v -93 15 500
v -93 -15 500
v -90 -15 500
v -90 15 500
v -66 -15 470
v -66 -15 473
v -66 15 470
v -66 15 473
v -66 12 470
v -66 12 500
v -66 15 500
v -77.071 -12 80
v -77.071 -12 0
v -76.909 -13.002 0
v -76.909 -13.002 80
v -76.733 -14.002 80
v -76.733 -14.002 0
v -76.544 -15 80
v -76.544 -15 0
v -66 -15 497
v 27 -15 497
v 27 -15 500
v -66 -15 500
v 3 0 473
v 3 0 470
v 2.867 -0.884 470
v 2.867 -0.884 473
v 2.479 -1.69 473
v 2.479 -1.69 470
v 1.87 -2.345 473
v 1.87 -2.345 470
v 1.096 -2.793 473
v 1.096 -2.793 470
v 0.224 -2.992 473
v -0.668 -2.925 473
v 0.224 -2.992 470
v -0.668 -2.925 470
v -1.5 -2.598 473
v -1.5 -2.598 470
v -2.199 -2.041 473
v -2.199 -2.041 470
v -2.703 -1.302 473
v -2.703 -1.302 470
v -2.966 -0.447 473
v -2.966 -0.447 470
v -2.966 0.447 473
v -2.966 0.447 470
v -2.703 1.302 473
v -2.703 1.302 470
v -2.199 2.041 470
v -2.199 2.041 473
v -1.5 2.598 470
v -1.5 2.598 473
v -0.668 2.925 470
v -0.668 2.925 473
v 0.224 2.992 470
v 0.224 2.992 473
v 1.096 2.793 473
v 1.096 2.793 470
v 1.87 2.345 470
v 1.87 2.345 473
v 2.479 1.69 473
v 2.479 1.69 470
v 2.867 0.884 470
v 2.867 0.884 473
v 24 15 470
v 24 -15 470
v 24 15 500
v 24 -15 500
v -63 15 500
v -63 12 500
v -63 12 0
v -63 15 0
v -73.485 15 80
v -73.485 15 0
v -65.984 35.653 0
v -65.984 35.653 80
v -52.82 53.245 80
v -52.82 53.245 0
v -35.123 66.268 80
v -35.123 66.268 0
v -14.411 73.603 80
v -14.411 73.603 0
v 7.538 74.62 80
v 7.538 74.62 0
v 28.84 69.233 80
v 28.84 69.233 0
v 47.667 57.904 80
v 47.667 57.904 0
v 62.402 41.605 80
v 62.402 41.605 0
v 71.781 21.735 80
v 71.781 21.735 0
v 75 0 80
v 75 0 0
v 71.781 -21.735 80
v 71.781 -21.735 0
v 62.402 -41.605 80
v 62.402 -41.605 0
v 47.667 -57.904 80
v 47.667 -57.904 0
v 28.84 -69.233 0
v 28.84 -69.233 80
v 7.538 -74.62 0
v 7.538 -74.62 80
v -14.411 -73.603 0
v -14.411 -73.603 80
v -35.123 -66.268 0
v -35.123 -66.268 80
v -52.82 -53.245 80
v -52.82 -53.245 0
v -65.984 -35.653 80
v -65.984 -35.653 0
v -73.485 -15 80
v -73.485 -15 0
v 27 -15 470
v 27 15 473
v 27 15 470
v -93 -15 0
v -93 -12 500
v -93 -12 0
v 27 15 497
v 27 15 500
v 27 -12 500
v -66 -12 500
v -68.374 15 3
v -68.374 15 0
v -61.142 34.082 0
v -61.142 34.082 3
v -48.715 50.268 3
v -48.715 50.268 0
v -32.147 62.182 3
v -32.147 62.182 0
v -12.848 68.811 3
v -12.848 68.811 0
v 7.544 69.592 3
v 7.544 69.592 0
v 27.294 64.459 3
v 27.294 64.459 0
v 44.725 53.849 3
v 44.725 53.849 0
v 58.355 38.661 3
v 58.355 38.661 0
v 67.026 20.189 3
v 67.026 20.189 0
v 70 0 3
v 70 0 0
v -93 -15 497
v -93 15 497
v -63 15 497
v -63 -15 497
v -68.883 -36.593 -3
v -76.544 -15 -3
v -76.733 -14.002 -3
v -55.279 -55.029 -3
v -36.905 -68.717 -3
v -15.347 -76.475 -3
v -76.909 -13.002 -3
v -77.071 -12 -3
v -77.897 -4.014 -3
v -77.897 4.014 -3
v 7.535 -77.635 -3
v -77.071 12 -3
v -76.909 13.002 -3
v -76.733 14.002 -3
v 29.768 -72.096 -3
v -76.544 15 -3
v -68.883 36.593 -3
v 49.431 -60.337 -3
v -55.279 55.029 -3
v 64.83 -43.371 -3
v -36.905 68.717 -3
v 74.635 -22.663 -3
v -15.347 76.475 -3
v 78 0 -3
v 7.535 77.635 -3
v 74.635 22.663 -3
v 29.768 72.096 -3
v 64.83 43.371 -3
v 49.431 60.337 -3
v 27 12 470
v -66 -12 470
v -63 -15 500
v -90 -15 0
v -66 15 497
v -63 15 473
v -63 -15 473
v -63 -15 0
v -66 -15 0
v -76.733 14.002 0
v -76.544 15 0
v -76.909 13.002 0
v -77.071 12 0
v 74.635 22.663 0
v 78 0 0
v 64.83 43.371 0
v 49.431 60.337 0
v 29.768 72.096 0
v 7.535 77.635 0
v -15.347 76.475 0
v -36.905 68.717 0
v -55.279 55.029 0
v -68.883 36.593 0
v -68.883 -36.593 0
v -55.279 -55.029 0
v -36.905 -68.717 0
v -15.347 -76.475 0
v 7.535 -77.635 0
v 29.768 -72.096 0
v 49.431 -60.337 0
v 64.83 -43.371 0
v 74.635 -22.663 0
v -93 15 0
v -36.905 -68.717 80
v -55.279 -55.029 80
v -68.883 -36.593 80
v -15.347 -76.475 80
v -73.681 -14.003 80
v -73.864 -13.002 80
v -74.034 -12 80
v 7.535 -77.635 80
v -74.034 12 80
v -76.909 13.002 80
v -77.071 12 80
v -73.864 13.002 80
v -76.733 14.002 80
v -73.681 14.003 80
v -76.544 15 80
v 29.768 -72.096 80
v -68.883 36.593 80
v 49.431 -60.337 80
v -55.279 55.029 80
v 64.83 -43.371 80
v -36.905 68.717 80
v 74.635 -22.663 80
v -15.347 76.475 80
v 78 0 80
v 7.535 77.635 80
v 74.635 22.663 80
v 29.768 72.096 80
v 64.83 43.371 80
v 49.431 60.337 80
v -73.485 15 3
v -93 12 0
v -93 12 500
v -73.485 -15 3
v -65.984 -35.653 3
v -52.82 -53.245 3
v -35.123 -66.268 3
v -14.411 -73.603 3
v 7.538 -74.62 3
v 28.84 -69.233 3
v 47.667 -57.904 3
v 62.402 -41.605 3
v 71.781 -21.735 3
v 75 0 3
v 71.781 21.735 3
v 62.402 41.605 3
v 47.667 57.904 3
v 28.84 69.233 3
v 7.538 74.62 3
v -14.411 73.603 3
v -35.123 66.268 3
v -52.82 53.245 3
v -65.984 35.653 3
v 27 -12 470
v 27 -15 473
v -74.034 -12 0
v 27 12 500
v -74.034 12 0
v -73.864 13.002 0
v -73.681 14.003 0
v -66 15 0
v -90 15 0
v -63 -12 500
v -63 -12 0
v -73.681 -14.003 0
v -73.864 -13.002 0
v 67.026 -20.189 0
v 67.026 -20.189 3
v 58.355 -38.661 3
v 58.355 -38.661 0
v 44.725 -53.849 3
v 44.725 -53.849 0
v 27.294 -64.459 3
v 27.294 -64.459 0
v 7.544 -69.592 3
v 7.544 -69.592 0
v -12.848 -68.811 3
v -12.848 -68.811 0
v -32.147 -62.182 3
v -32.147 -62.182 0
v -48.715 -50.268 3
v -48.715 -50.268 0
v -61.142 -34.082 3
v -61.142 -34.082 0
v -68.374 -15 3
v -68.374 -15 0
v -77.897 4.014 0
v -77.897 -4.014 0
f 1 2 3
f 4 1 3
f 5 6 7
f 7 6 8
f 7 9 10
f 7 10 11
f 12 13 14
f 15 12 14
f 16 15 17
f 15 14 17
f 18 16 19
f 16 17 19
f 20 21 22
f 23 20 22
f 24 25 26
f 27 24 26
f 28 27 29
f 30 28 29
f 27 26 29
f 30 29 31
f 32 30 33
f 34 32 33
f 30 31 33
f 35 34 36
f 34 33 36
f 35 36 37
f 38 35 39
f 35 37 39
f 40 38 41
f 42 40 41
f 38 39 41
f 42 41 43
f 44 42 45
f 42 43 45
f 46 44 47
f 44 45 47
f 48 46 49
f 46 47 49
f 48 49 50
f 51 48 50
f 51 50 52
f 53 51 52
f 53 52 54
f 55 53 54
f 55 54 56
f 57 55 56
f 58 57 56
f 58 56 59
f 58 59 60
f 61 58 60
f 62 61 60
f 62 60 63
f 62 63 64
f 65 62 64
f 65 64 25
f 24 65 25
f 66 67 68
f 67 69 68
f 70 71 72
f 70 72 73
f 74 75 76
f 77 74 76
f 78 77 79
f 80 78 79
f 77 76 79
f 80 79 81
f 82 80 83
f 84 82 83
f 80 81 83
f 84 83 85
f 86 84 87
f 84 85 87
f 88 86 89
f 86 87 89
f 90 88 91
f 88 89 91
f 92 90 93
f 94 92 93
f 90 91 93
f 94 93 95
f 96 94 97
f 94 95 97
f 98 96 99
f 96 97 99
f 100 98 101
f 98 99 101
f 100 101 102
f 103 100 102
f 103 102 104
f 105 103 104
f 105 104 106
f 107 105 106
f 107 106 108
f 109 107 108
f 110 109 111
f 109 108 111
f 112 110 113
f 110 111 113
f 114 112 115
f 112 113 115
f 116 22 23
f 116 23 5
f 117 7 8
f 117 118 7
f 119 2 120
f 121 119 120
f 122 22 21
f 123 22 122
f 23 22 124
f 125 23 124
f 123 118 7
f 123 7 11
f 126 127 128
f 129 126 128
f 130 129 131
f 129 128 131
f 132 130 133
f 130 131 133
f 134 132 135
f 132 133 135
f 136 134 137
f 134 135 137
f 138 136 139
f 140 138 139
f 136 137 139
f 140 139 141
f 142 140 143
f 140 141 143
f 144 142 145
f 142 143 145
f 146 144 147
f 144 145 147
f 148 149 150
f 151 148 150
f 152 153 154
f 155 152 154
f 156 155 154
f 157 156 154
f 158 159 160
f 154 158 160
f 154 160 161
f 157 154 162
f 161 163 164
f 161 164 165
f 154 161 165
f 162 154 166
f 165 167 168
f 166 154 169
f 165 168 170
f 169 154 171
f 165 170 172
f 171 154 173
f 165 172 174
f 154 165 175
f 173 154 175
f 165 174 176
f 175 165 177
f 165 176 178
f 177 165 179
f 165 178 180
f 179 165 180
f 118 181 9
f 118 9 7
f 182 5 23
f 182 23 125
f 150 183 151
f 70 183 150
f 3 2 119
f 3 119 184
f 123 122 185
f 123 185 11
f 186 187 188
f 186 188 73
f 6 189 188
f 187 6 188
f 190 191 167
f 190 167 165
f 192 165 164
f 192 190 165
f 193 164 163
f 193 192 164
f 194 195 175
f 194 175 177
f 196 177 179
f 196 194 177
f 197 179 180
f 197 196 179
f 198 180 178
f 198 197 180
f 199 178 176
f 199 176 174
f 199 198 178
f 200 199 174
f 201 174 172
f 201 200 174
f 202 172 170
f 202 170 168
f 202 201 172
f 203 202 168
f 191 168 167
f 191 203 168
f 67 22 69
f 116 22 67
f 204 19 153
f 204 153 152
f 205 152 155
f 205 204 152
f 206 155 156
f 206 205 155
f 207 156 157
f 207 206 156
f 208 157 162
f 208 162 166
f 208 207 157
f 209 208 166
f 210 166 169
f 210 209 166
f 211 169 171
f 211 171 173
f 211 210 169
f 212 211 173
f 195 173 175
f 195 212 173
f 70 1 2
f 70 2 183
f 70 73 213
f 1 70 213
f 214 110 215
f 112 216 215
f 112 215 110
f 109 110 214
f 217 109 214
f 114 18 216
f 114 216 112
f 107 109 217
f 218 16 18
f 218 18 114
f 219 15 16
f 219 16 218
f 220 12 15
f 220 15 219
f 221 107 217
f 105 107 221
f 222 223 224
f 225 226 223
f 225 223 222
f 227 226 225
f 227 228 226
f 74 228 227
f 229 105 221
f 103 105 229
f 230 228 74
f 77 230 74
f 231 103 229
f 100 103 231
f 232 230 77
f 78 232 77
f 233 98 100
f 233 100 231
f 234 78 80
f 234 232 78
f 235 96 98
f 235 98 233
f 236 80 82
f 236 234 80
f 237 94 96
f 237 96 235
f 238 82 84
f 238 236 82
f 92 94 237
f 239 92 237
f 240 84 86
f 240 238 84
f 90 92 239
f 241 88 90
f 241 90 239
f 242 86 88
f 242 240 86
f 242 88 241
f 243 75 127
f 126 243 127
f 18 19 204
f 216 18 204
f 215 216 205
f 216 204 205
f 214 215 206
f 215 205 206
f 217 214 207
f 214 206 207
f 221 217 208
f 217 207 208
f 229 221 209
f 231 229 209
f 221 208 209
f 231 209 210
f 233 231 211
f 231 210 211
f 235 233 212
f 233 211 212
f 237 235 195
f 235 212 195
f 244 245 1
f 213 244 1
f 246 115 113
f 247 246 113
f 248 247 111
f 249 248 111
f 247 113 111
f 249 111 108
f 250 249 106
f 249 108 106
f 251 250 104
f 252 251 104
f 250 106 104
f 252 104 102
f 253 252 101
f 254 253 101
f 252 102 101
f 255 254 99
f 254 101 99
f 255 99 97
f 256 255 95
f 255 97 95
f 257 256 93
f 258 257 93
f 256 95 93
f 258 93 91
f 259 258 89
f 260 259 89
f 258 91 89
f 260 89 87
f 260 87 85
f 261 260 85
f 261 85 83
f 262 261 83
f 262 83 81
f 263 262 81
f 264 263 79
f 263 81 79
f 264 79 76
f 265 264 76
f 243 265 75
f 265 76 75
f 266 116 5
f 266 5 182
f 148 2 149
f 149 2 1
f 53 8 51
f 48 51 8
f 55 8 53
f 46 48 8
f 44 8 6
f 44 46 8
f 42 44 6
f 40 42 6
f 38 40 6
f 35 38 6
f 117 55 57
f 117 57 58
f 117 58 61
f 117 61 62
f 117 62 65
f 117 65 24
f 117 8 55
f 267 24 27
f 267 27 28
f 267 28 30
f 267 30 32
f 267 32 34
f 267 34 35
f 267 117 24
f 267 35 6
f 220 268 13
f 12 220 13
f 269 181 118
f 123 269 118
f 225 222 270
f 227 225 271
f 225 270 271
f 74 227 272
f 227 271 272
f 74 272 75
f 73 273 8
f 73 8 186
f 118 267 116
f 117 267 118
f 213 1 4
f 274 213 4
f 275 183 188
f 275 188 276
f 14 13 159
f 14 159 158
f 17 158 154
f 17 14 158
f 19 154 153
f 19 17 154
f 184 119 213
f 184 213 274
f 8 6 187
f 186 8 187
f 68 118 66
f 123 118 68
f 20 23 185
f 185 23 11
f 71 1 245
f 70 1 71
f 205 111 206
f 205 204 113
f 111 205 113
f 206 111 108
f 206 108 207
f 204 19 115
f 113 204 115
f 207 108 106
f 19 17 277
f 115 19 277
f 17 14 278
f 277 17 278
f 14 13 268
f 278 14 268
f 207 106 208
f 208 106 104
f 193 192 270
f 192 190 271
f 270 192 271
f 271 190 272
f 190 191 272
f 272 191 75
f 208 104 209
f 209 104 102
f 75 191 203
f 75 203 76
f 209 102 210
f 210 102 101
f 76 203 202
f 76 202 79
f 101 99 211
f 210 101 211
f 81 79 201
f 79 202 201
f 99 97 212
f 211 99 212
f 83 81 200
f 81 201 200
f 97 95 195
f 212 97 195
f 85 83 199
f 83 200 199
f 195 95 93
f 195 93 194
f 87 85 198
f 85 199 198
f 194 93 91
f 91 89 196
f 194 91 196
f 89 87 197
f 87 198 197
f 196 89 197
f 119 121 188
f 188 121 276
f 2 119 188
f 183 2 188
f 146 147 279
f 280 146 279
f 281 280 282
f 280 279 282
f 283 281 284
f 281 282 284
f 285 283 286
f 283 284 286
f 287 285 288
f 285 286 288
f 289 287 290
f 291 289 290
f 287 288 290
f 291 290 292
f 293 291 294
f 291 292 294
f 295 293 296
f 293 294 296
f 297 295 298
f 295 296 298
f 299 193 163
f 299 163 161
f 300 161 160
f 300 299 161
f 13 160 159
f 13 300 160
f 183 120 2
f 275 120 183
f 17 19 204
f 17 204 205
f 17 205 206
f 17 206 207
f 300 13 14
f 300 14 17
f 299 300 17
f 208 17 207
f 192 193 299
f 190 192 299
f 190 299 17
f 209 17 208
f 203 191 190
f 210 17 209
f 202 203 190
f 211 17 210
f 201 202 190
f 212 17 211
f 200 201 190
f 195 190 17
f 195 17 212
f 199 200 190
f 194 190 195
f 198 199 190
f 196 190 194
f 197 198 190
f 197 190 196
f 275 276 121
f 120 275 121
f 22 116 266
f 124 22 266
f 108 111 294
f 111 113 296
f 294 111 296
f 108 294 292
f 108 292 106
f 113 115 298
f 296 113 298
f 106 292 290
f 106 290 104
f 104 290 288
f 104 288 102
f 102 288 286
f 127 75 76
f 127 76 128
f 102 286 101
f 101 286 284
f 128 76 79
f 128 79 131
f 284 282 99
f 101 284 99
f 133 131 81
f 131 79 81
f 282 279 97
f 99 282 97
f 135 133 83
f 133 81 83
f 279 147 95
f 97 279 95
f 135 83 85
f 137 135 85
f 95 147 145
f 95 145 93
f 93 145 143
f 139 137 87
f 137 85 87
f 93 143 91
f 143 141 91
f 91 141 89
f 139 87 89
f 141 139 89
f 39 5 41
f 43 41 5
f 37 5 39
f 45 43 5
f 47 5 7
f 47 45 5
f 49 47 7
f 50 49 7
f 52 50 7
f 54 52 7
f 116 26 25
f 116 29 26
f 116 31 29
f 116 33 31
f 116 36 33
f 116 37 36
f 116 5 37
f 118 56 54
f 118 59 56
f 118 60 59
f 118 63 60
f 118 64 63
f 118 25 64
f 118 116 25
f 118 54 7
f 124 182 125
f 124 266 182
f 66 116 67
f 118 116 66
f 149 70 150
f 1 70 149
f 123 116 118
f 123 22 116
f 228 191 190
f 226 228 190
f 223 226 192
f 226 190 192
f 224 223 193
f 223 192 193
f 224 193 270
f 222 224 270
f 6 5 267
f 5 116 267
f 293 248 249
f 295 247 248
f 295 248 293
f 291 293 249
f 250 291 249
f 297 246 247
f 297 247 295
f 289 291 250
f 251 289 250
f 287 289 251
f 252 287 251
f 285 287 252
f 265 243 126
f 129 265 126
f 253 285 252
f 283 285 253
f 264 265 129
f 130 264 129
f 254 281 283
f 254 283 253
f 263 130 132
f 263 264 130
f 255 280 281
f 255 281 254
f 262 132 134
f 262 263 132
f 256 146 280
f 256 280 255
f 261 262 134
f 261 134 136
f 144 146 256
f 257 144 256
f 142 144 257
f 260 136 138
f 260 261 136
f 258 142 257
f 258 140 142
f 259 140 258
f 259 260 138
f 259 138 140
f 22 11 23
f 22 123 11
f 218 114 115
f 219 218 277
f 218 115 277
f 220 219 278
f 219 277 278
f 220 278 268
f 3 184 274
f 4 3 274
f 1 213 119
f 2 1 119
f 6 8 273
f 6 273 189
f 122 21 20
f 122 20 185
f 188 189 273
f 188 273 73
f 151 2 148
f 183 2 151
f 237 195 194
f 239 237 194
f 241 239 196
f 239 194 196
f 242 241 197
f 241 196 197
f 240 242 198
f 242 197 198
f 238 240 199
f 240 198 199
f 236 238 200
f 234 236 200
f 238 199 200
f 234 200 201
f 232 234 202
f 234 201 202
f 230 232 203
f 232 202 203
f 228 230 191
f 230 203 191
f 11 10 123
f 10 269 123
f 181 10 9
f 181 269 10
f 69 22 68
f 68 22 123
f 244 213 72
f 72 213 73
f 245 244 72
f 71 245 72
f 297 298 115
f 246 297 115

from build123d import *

# Parameters (mm, degrees)
F4_W           = 3
F4_H           = 24
F4_H_2         = 3
F5_DEPTH       = 3
F6_DEPTH       = 3
F7_DEPTH       = 80
F8_DEPTH       = 500
F9_DEPTH       = 500
F10_DEPTH      = 473
F11_W          = 3
F11_H          = 24
F11_H_2        = 3
F12_DEPTH      = 90
F12_DEPTH_BACK = 3
F11_W_2        = 24
F13_DEPTH      = 90
F13_DEPTH_BACK = 3
F14_W          = 30
F14_H          = 27
F14_H_2        = 3
F15_DEPTH      = 3
F16_W          = 27
F16_H          = 30
F16_W_2        = 3
F17_DEPTH      = 3
F18_R          = 3
F19_DEPTH      = 488


with BuildPart() as f5:
    # F4 (on Top) → F5 (new body)
    with BuildSketch(Plane.XY):
        with BuildLine():
            Line((-68.3739716559, 15), (-73.4846922835, 15))
            ThreePointArc((-73.4846922835, 15), (-73.7744849304, 13.5027913134), (-74.0337760755, 12))
            Line((-74.0337760755, 12), (-68.9637585983, 12))
            ThreePointArc((-68.9637585983, 12), (-68.6852461438, 13.5032204366), (-68.3739716559, 15))
        make_face()
        with BuildLine():
            Line((-68.9637585983, 12), (-74.0337760755, 12))
            ThreePointArc((-74.0337760755, 12), (-75, 0), (-74.0337760755, -12))
            Line((-74.0337760755, -12), (-68.9637585983, -12))
            ThreePointArc((-68.9637585983, -12), (-70, 0), (-68.9637585983, 12))
        make_face()
        with BuildLine():
            ThreePointArc((-74.0337760755, -12), (-73.7744849304, -13.5027913134), (-73.4846922835, -15))
            Line((-73.4846922835, -15), (-68.3739716559, -15))
            ThreePointArc((-68.3739716559, -15), (-68.6852461438, -13.5032204366), (-68.9637585983, -12))
            Line((-68.9637585983, -12), (-74.0337760755, -12))
        make_face()
        with BuildLine():
            ThreePointArc((-73.4846922835, -15), (7.5381721504, -74.6202114754), (75, 0))
            ThreePointArc((75, 0), (7.5381721504, 74.6202114754), (-73.4846922835, 15))
            Line((-73.4846922835, 15), (-68.3739716559, 15))
            ThreePointArc((-68.3739716559, 15), (7.5439374364, 69.5923056663), (70, 0))
            ThreePointArc((70, 0), (7.5439374364, -69.5923056663), (-68.3739716559, -15))
            Line((-68.3739716559, -15), (-73.4846922835, -15))
        make_face()
        with BuildLine():
            ThreePointArc((-74.0337760755, 12), (-73.7744849304, 13.5027913134), (-73.4846922835, 15))
            Line((-73.4846922835, 15), (-76.544104933, 15))
            ThreePointArc((-76.544104933, 15), (-76.8223957656, 13.5025741556), (-77.071395472, 12))
            Line((-77.071395472, 12), (-74.0337760755, 12))
        make_face()
        with BuildLine():
            ThreePointArc((-74.0337760755, -12), (-75, 0), (-74.0337760755, 12))
            Line((-74.0337760755, 12), (-77.071395472, 12))
            ThreePointArc((-77.071395472, 12), (-78, 0), (-77.071395472, -12))
            Line((-77.071395472, -12), (-74.0337760755, -12))
        make_face()
        with BuildLine():
            Line((-76.544104933, -15), (-73.4846922835, -15))
            ThreePointArc((-73.4846922835, -15), (-73.7744849304, -13.5027913134), (-74.0337760755, -12))
            Line((-74.0337760755, -12), (-77.071395472, -12))
            ThreePointArc((-77.071395472, -12), (-76.8223957656, -13.5025741556), (-76.544104933, -15))
        make_face()
        with BuildLine():
            ThreePointArc((-73.4846922835, 15), (7.5381721504, 74.6202114754), (75, 0))
            ThreePointArc((75, 0), (7.5381721504, -74.6202114754), (-73.4846922835, -15))
            Line((-73.4846922835, -15), (-76.544104933, -15))
            ThreePointArc((-76.544104933, -15), (7.5352443631, -77.6351730364), (78, 0))
            ThreePointArc((78, 0), (7.5352443631, 77.6351730364), (-76.544104933, 15))
            Line((-76.544104933, 15), (-73.4846922835, 15))
        make_face()
        with BuildLine():
            Line((-66, 12), (-68.9637585983, 12))
            ThreePointArc((-68.9637585983, 12), (-70, 0), (-68.9637585983, -12))
            Line((-68.9637585983, -12), (-66, -12))
            Line((-66, -12), (-66, 12))
        make_face()
        with BuildLine():
            ThreePointArc((70, 0), (7.5439374364, 69.5923056663), (-68.3739716559, 15))
            Line((-68.3739716559, 15), (-66, 15))
            Line((-66, 15), (-63, 15))
            Line((-63, 15), (-63, 12))
            Line((-63, 12), (-63, -12))
            Line((-63, -12), (-63, -15))
            Line((-63, -15), (-66, -15))
            Line((-66, -15), (-68.3739716559, -15))
            ThreePointArc((-68.3739716559, -15), (7.5439374364, -69.5923056663), (70, 0))
        make_face()
        with BuildLine():
            Line((-66, 15), (-68.3739716559, 15))
            ThreePointArc((-68.3739716559, 15), (-68.6852461438, 13.5032204366), (-68.9637585983, 12))
            Line((-68.9637585983, 12), (-66, 12))
            Line((-66, 12), (-66, 15))
        make_face()
        with Locations((-64.5, 0)):
            Rectangle(F4_W, F4_H)
        with Locations((-64.5, 13.5)):
            Rectangle(F4_W, F4_H_2)
        with BuildLine():
            ThreePointArc((-68.9637585983, -12), (-68.6852461438, -13.5032204366), (-68.3739716559, -15))
            Line((-68.3739716559, -15), (-66, -15))
            Line((-66, -15), (-66, -12))
            Line((-66, -12), (-68.9637585983, -12))
        make_face()
        with Locations((-64.5, -13.5)):
            Rectangle(F4_W, F4_H_2)
    extrude(amount=-F5_DEPTH)


with BuildPart() as f6:
    # F4 (on Top) → F6 (new body)
    with BuildSketch(Plane.XY):
        with BuildLine():
            ThreePointArc((-73.4846922835, -15), (7.5381721504, -74.6202114754), (75, 0))
            ThreePointArc((75, 0), (7.5381721504, 74.6202114754), (-73.4846922835, 15))
            Line((-73.4846922835, 15), (-68.3739716559, 15))
            ThreePointArc((-68.3739716559, 15), (7.5439374364, 69.5923056663), (70, 0))
            ThreePointArc((70, 0), (7.5439374364, -69.5923056663), (-68.3739716559, -15))
            Line((-68.3739716559, -15), (-73.4846922835, -15))
        make_face()
    extrude(amount=F6_DEPTH)


with BuildPart() as f7:
    # F4 (on Top) → F7 (new body)
    with BuildSketch(Plane.XY):
        with BuildLine():
            ThreePointArc((-73.4846922835, 15), (7.5381721504, 74.6202114754), (75, 0))
            ThreePointArc((75, 0), (7.5381721504, -74.6202114754), (-73.4846922835, -15))
            Line((-73.4846922835, -15), (-76.544104933, -15))
            ThreePointArc((-76.544104933, -15), (7.5352443631, -77.6351730364), (78, 0))
            ThreePointArc((78, 0), (7.5352443631, 77.6351730364), (-76.544104933, 15))
            Line((-76.544104933, 15), (-73.4846922835, 15))
        make_face()
        with BuildLine():
            ThreePointArc((-74.0337760755, 12), (-73.7744849304, 13.5027913134), (-73.4846922835, 15))
            Line((-73.4846922835, 15), (-76.544104933, 15))
            ThreePointArc((-76.544104933, 15), (-76.8223957656, 13.5025741556), (-77.071395472, 12))
            Line((-77.071395472, 12), (-74.0337760755, 12))
        make_face()
        with BuildLine():
            Line((-76.544104933, -15), (-73.4846922835, -15))
            ThreePointArc((-73.4846922835, -15), (-73.7744849304, -13.5027913134), (-74.0337760755, -12))
            Line((-74.0337760755, -12), (-77.071395472, -12))
            ThreePointArc((-77.071395472, -12), (-76.8223957656, -13.5025741556), (-76.544104933, -15))
        make_face()
    extrude(amount=F7_DEPTH)


with BuildPart() as f8:
    # F4 (on Top) → F8 (new body)
    with BuildSketch(Plane.XY):
        with BuildLine():
            ThreePointArc((-77.071395472, 12), (-76.8223957656, 13.5025741556), (-76.544104933, 15))
            Line((-76.544104933, 15), (-90, 15))
            Line((-90, 15), (-90, 12))
            Line((-90, 12), (-77.071395472, 12))
        make_face()
        with BuildLine():
            ThreePointArc((-74.0337760755, 12), (-73.7744849304, 13.5027913134), (-73.4846922835, 15))
            Line((-73.4846922835, 15), (-76.544104933, 15))
            ThreePointArc((-76.544104933, 15), (-76.8223957656, 13.5025741556), (-77.071395472, 12))
            Line((-77.071395472, 12), (-74.0337760755, 12))
        make_face()
        with BuildLine():
            Line((-68.3739716559, 15), (-73.4846922835, 15))
            ThreePointArc((-73.4846922835, 15), (-73.7744849304, 13.5027913134), (-74.0337760755, 12))
            Line((-74.0337760755, 12), (-68.9637585983, 12))
            ThreePointArc((-68.9637585983, 12), (-68.6852461438, 13.5032204366), (-68.3739716559, 15))
        make_face()
        with BuildLine():
            Line((-66, 15), (-68.3739716559, 15))
            ThreePointArc((-68.3739716559, 15), (-68.6852461438, 13.5032204366), (-68.9637585983, 12))
            Line((-68.9637585983, 12), (-66, 12))
            Line((-66, 12), (-66, 15))
        make_face()
        with Locations((-64.5, 13.5)):
            Rectangle(F4_W, F4_H_2)
        with Locations((-91.5, 13.5)):
            Rectangle(F4_W, F4_H_2)
    extrude(amount=F8_DEPTH)


with BuildPart() as f8b:
    # F4 (on Top) → F8, piece 2 (new body)
    with BuildSketch(Plane.XY):
        with Locations((-64.5, -13.5)):
            Rectangle(F4_W, F4_H_2)
        with BuildLine():
            ThreePointArc((-68.9637585983, -12), (-68.6852461438, -13.5032204366), (-68.3739716559, -15))
            Line((-68.3739716559, -15), (-66, -15))
            Line((-66, -15), (-66, -12))
            Line((-66, -12), (-68.9637585983, -12))
        make_face()
        with BuildLine():
            ThreePointArc((-74.0337760755, -12), (-73.7744849304, -13.5027913134), (-73.4846922835, -15))
            Line((-73.4846922835, -15), (-68.3739716559, -15))
            ThreePointArc((-68.3739716559, -15), (-68.6852461438, -13.5032204366), (-68.9637585983, -12))
            Line((-68.9637585983, -12), (-74.0337760755, -12))
        make_face()
        with BuildLine():
            Line((-76.544104933, -15), (-73.4846922835, -15))
            ThreePointArc((-73.4846922835, -15), (-73.7744849304, -13.5027913134), (-74.0337760755, -12))
            Line((-74.0337760755, -12), (-77.071395472, -12))
            ThreePointArc((-77.071395472, -12), (-76.8223957656, -13.5025741556), (-76.544104933, -15))
        make_face()
        with BuildLine():
            Line((-90, -15), (-76.544104933, -15))
            ThreePointArc((-76.544104933, -15), (-76.8223957656, -13.5025741556), (-77.071395472, -12))
            Line((-77.071395472, -12), (-90, -12))
            Line((-90, -12), (-90, -15))
        make_face()
        with Locations((-91.5, -13.5)):
            Rectangle(F4_W, F4_H_2)
    extrude(amount=F8_DEPTH)


with BuildPart() as f9:
    # F4 (on Top) → F9 (new body)
    with BuildSketch(Plane.XY):
        with Locations((-91.5, 0)):
            Rectangle(F4_W, F4_H)
        with Locations((-91.5, -13.5)):
            Rectangle(F4_W, F4_H_2)
        with Locations((-91.5, 13.5)):
            Rectangle(F4_W, F4_H_2)
    extrude(amount=F9_DEPTH)


with BuildPart() as f10:
    # F4 (on Top) → F10 (new body)
    with BuildSketch(Plane.XY):
        with Locations((-64.5, 0)):
            Rectangle(F4_W, F4_H)
        with Locations((-64.5, -13.5)):
            Rectangle(F4_W, F4_H_2)
        with Locations((-64.5, 13.5)):
            Rectangle(F4_W, F4_H_2)
    extrude(amount=F10_DEPTH)


with BuildPart() as f12:
    # F11 (on face) → F12 (new body, two sides)
    with BuildSketch(Plane.YZ.offset(-63)) as f12_sk:
        with Locations((-13.5, 485)):
            Rectangle(F11_W, F11_H)
        with Locations((-13.5, 498.5)):
            Rectangle(F11_W, F11_H_2)
        with Locations((-13.5, 471.5)):
            Rectangle(F11_W, F11_H_2)
    extrude(amount=F12_DEPTH)
    extrude(f12_sk.sketch, amount=-F12_DEPTH_BACK)


with BuildPart() as f12b:
    # F11 (on face) → F12, piece 2 (new body, two sides)
    with BuildSketch(Plane.YZ.offset(-63)) as f12_2_sk:
        with Locations((13.5, 498.5)):
            Rectangle(F11_W, F11_H_2)
        with Locations((13.5, 485)):
            Rectangle(F11_W, F11_H)
        with Locations((13.5, 471.5)):
            Rectangle(F11_W, F11_H_2)
    extrude(amount=F12_DEPTH)
    extrude(f12_2_sk.sketch, amount=-F12_DEPTH_BACK)


with BuildPart() as f13:
    # F11 (on face) → F13 (new body, two sides)
    with BuildSketch(Plane.YZ.offset(-63)) as f13_sk:
        with Locations((0, 498.5)):
            Rectangle(F11_W_2, F11_H_2)
        with Locations((-13.5, 498.5)):
            Rectangle(F11_W, F11_H_2)
        with Locations((13.5, 498.5)):
            Rectangle(F11_W, F11_H_2)
    extrude(amount=F13_DEPTH)
    extrude(f13_sk.sketch, amount=-F13_DEPTH_BACK)


with BuildPart() as f13b:
    # F11 (on face) → F13, piece 2 (new body, two sides)
    with BuildSketch(Plane.YZ.offset(-63)) as f13_2_sk:
        with Locations((13.5, 471.5)):
            Rectangle(F11_W, F11_H_2)
        with Locations((0, 471.5)):
            Rectangle(F11_W_2, F11_H_2)
        with Locations((-13.5, 471.5)):
            Rectangle(F11_W, F11_H_2)
    extrude(amount=F13_DEPTH)
    extrude(f13_2_sk.sketch, amount=-F13_DEPTH_BACK)


with BuildPart() as f15:
    # F14 (on face) → F15 (new body)
    with BuildSketch(Plane.YZ.offset(27)):
        with Locations((0, 483.5)):
            Rectangle(F14_W, F14_H)
        with Locations((0, 498.5)):
            Rectangle(F14_W, F14_H_2)
    extrude(amount=-F15_DEPTH)


with BuildPart() as f17:
    # F16 (on face) → F17 (new body)
    with BuildSketch(Plane.XY.offset(500)):
        with Locations((-76.5, 0)):
            Rectangle(F16_W, F16_H)
        with Locations((-91.5, 0)):
            Rectangle(F16_W_2, F16_H)
    extrude(amount=-F17_DEPTH)


with BuildPart() as f19:
    # F18 (on face) → F19 (new body)
    with BuildSketch(Plane(origin=(0, 0, -3), x_dir=(1, 0, 0), z_dir=(0, 0, -1))):
        Circle(F18_R)
    extrude(amount=-F19_DEPTH)


with BuildPart() as f13b_1:
    add(f13b.part)

    # F20: cut F19
    add(f19.part, mode=Mode.SUBTRACT)


solid = Compound([f5.part, f6.part, f7.part, f8.part, f8b.part, f9.part, f10.part, f12.part, f12b.part, f13.part, f15.part, f17.part, f13b_1.part])
